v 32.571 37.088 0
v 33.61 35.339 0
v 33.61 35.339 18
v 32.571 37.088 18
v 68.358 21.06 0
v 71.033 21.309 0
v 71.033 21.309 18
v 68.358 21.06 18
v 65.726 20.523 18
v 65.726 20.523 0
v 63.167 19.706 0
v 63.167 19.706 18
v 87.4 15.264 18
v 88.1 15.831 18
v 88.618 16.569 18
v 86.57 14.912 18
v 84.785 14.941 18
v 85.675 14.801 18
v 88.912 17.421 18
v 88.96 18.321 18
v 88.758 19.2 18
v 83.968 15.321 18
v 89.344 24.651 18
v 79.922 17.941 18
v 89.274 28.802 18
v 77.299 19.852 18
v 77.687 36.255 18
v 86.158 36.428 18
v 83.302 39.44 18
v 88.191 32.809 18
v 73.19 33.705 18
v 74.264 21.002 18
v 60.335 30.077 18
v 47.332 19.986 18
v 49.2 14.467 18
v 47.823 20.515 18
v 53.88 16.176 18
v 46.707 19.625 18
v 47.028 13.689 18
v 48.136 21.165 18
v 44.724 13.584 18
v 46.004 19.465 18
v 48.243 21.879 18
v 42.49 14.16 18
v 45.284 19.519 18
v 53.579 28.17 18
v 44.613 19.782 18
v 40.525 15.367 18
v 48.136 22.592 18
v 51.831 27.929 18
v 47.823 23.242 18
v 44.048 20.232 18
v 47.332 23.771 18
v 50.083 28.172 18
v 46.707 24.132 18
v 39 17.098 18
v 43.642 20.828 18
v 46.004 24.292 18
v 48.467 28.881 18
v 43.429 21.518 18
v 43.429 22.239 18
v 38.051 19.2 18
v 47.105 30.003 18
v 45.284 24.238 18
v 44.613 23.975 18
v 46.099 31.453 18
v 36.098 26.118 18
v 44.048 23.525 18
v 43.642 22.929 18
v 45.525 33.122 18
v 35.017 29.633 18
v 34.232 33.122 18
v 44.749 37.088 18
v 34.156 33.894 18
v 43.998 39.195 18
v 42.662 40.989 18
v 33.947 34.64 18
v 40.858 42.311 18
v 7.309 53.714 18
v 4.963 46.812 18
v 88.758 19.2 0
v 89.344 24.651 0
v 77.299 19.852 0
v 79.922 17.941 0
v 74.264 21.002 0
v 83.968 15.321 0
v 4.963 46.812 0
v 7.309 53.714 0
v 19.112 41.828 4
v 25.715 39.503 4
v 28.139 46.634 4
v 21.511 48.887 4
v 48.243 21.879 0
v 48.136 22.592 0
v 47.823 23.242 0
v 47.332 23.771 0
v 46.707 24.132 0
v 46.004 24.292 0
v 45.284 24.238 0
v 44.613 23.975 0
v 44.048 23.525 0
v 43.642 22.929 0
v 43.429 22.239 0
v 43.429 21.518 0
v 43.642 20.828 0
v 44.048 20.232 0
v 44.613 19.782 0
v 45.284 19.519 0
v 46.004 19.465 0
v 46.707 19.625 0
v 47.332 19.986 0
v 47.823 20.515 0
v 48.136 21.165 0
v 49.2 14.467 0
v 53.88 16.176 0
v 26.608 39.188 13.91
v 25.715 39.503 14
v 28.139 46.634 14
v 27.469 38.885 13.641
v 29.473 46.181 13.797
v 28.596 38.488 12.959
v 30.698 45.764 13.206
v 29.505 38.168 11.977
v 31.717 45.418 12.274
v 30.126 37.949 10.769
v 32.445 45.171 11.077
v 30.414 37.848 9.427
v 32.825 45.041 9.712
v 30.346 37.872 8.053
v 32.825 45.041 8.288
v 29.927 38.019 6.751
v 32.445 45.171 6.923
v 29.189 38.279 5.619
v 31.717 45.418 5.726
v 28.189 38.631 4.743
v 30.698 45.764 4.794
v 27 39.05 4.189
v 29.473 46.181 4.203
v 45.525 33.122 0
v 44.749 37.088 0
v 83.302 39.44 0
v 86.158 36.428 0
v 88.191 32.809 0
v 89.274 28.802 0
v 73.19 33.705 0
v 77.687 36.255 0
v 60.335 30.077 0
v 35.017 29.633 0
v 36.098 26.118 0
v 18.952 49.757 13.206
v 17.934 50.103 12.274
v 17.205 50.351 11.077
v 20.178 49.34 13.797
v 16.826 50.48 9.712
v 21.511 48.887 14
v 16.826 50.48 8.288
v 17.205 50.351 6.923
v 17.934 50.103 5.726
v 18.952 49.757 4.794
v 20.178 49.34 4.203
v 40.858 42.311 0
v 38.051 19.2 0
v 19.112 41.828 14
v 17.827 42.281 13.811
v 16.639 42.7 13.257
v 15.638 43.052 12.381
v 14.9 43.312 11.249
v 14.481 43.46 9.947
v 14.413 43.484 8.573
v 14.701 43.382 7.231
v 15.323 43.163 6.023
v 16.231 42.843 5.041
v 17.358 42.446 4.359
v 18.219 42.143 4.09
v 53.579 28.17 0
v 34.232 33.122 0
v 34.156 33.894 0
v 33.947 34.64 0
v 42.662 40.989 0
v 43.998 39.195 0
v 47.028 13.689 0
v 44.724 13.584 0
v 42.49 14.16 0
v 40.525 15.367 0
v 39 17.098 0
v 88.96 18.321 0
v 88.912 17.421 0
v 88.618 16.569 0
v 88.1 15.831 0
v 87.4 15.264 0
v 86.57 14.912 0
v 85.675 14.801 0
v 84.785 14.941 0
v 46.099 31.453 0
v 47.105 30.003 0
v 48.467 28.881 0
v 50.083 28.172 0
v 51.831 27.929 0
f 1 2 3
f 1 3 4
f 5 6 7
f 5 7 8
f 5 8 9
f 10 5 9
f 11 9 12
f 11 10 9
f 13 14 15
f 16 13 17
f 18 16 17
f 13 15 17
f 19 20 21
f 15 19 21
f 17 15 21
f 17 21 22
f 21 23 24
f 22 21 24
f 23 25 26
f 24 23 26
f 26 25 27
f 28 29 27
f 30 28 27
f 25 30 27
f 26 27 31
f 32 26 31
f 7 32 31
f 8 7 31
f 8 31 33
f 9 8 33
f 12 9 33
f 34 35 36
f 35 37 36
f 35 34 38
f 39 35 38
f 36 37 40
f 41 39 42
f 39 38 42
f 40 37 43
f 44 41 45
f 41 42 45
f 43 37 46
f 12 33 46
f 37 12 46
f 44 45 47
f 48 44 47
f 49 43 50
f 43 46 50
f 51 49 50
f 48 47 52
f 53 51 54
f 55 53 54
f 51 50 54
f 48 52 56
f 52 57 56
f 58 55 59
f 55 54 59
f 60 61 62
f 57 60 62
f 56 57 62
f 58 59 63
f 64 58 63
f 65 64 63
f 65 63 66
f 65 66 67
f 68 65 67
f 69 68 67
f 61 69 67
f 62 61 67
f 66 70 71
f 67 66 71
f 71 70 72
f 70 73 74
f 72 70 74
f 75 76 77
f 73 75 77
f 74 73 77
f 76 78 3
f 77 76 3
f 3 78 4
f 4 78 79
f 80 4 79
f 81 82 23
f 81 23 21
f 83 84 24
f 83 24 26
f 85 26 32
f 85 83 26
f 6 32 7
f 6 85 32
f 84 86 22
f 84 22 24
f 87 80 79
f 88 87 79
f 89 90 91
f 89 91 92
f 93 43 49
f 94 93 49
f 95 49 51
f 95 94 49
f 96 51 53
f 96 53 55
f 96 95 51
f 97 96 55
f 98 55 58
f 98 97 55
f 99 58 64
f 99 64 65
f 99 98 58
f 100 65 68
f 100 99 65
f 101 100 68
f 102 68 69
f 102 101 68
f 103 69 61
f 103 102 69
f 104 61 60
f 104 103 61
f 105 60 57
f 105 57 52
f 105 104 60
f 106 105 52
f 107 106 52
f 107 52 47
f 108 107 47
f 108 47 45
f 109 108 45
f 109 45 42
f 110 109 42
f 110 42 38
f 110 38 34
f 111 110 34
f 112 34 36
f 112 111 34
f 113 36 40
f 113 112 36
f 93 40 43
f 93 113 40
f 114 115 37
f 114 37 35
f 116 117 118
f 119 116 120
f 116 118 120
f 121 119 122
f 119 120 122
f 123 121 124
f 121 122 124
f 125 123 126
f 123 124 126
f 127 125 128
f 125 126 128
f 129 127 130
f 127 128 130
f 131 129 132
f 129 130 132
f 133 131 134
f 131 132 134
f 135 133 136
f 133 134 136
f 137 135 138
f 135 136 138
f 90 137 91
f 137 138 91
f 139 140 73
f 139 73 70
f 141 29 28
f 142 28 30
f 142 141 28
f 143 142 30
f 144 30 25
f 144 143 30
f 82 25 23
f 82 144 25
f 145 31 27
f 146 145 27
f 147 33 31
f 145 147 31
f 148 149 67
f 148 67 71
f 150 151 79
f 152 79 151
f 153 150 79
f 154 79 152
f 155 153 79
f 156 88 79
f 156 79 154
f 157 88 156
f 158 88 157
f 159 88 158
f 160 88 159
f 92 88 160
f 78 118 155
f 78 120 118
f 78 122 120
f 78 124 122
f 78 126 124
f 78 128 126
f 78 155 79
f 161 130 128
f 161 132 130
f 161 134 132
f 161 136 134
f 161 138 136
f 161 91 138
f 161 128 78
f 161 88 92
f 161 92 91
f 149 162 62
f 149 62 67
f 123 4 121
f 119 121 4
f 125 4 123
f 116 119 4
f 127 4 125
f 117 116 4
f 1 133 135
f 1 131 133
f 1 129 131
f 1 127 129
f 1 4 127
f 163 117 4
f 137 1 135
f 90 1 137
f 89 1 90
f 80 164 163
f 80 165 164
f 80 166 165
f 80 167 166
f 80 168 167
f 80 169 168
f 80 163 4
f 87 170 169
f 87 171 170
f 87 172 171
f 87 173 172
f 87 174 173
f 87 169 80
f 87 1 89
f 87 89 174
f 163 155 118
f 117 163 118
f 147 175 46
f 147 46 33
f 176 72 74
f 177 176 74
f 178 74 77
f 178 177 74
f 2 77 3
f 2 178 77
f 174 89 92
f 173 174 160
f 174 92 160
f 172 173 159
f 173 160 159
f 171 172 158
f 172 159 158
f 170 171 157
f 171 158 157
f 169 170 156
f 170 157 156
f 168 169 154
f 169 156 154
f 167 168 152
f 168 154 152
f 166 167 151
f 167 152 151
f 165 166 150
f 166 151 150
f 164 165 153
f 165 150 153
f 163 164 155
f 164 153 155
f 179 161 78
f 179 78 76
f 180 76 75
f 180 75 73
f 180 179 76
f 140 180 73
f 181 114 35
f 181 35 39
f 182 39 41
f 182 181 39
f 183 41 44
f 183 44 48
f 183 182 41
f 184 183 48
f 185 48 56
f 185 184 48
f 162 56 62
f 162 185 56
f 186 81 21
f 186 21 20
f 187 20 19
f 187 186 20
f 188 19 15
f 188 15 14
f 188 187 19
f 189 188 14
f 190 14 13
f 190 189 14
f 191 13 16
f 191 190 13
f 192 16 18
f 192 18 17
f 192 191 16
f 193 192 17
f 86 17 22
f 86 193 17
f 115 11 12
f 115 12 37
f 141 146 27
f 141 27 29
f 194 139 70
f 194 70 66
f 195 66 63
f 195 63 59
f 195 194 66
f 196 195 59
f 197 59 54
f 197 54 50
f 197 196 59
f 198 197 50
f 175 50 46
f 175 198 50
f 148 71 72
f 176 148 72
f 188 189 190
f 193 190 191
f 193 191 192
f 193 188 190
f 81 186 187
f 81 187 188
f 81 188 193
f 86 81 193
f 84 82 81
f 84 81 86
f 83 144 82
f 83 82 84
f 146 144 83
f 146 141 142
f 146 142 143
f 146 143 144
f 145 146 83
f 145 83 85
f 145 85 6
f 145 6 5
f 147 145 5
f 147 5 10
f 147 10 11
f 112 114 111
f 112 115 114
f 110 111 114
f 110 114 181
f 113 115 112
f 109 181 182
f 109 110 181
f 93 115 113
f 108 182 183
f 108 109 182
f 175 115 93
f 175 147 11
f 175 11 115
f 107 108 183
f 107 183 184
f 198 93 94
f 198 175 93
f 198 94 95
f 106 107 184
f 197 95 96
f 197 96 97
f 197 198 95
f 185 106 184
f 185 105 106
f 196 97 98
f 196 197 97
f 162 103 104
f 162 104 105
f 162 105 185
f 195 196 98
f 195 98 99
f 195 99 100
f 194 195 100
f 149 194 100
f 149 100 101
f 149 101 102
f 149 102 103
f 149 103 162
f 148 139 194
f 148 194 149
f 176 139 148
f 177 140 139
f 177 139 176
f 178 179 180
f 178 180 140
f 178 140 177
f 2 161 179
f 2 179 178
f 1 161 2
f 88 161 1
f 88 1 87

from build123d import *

# Parameters (mm, degrees)
ESQUISSE1_R             = 2.420540081
BOSS_EXTRU_1_DEPTH      = 18
ENL_V_MAT_EXTRU_1_DEPTH = 39.789502353


with BuildPart() as part:
    # Esquisse1 → Boss.-Extru.1 (new body)
    with BuildSketch(Plane.XY):
        with BuildLine():
            Line((7.309445695, 53.714347138), (40.857601275, 42.311087759))
            ThreePointArc((40.857601275, 42.311087759), (43.397194427, 40.141751778), (44.749299605, 37.087678504))
            Line((44.749299605, 37.087678504), (45.525391945, 33.121685243))
            ThreePointArc((45.525391945, 33.121685243), (48.466826033, 28.880719759), (53.578886424, 28.170324589))
            Line((53.578886424, 28.170324589), (60.334857797, 30.077073056))
            Line((60.334857797, 30.077073056), (73.18964939, 33.705101183))
            Line((73.18964939, 33.705101183), (77.686625145, 36.255437702))
            Line((77.686625145, 36.255437702), (83.301564432, 39.439796589))
            ThreePointArc((83.301564432, 39.439796589), (88.190630708, 32.808798216), (89.3438897, 24.651402666))
            Line((89.3438897, 24.651402666), (88.758364996, 19.199881093))
            ThreePointArc((88.758364996, 19.199881093), (87.769834705, 15.522983246), (83.96770833, 15.321476572))
            Line((83.96770833, 15.321476572), (79.922264923, 17.941129356))
            ThreePointArc((79.922264923, 17.941129356), (75.820018568, 20.528976888), (71.032935331, 21.309498572))
            ThreePointArc((71.032935331, 21.309498572), (67.034937106, 20.827330487), (63.167207989, 19.706104665))
            Line((63.167207989, 19.706104665), (53.880076109, 16.176154046))
            Line((53.880076109, 16.176154046), (49.199654782, 14.466799098))
            ThreePointArc((49.199654782, 14.466799098), (42.490348453, 14.160285015), (38.050617194, 19.199881093))
            Line((38.050617194, 19.199881093), (36.098238925, 26.117527504))
            Line((36.098238925, 26.117527504), (35.016515722, 29.633127914))
            Line((35.016515722, 29.633127914), (34.2322664, 33.121685243))
            ThreePointArc((34.2322664, 33.121685243), (34.067751372, 34.27153749), (33.610275558, 35.339217809))
            Line((33.610275558, 35.339217809), (32.57129733, 37.087678504))
            Line((32.57129733, 37.087678504), (4.96334494, 46.812166758))
            Line((4.96334494, 46.812166758), (7.309445695, 53.714347138))
        make_face()
        with Locations((45.822816194, 21.878618475)):
            Circle(ESQUISSE1_R, mode=Mode.SUBTRACT)
    extrude(amount=BOSS_EXTRU_1_DEPTH)

    # Esquisse2 → Enlèv. mat.-Extru.1 (cut, through all)
    with BuildSketch(Plane(origin=(17.123954965, 50.378324845, 0), x_dir=(0.946799522, -0.321823967, 0), z_dir=(0.321823967, 0.946799522, 0))):
        with BuildLine():
            Line((4.63401539, -14), (11.63401539, -14))
            ThreePointArc((11.63401539, -14), (16.63401539, -9), (11.63401539, -4))
            Line((11.63401539, -4), (4.63401539, -4))
            ThreePointArc((4.63401539, -4), (-0.36598461, -9), (4.63401539, -14))
        make_face()
    extrude(amount=-ENL_V_MAT_EXTRU_1_DEPTH, mode=Mode.SUBTRACT)


solid = part.part
